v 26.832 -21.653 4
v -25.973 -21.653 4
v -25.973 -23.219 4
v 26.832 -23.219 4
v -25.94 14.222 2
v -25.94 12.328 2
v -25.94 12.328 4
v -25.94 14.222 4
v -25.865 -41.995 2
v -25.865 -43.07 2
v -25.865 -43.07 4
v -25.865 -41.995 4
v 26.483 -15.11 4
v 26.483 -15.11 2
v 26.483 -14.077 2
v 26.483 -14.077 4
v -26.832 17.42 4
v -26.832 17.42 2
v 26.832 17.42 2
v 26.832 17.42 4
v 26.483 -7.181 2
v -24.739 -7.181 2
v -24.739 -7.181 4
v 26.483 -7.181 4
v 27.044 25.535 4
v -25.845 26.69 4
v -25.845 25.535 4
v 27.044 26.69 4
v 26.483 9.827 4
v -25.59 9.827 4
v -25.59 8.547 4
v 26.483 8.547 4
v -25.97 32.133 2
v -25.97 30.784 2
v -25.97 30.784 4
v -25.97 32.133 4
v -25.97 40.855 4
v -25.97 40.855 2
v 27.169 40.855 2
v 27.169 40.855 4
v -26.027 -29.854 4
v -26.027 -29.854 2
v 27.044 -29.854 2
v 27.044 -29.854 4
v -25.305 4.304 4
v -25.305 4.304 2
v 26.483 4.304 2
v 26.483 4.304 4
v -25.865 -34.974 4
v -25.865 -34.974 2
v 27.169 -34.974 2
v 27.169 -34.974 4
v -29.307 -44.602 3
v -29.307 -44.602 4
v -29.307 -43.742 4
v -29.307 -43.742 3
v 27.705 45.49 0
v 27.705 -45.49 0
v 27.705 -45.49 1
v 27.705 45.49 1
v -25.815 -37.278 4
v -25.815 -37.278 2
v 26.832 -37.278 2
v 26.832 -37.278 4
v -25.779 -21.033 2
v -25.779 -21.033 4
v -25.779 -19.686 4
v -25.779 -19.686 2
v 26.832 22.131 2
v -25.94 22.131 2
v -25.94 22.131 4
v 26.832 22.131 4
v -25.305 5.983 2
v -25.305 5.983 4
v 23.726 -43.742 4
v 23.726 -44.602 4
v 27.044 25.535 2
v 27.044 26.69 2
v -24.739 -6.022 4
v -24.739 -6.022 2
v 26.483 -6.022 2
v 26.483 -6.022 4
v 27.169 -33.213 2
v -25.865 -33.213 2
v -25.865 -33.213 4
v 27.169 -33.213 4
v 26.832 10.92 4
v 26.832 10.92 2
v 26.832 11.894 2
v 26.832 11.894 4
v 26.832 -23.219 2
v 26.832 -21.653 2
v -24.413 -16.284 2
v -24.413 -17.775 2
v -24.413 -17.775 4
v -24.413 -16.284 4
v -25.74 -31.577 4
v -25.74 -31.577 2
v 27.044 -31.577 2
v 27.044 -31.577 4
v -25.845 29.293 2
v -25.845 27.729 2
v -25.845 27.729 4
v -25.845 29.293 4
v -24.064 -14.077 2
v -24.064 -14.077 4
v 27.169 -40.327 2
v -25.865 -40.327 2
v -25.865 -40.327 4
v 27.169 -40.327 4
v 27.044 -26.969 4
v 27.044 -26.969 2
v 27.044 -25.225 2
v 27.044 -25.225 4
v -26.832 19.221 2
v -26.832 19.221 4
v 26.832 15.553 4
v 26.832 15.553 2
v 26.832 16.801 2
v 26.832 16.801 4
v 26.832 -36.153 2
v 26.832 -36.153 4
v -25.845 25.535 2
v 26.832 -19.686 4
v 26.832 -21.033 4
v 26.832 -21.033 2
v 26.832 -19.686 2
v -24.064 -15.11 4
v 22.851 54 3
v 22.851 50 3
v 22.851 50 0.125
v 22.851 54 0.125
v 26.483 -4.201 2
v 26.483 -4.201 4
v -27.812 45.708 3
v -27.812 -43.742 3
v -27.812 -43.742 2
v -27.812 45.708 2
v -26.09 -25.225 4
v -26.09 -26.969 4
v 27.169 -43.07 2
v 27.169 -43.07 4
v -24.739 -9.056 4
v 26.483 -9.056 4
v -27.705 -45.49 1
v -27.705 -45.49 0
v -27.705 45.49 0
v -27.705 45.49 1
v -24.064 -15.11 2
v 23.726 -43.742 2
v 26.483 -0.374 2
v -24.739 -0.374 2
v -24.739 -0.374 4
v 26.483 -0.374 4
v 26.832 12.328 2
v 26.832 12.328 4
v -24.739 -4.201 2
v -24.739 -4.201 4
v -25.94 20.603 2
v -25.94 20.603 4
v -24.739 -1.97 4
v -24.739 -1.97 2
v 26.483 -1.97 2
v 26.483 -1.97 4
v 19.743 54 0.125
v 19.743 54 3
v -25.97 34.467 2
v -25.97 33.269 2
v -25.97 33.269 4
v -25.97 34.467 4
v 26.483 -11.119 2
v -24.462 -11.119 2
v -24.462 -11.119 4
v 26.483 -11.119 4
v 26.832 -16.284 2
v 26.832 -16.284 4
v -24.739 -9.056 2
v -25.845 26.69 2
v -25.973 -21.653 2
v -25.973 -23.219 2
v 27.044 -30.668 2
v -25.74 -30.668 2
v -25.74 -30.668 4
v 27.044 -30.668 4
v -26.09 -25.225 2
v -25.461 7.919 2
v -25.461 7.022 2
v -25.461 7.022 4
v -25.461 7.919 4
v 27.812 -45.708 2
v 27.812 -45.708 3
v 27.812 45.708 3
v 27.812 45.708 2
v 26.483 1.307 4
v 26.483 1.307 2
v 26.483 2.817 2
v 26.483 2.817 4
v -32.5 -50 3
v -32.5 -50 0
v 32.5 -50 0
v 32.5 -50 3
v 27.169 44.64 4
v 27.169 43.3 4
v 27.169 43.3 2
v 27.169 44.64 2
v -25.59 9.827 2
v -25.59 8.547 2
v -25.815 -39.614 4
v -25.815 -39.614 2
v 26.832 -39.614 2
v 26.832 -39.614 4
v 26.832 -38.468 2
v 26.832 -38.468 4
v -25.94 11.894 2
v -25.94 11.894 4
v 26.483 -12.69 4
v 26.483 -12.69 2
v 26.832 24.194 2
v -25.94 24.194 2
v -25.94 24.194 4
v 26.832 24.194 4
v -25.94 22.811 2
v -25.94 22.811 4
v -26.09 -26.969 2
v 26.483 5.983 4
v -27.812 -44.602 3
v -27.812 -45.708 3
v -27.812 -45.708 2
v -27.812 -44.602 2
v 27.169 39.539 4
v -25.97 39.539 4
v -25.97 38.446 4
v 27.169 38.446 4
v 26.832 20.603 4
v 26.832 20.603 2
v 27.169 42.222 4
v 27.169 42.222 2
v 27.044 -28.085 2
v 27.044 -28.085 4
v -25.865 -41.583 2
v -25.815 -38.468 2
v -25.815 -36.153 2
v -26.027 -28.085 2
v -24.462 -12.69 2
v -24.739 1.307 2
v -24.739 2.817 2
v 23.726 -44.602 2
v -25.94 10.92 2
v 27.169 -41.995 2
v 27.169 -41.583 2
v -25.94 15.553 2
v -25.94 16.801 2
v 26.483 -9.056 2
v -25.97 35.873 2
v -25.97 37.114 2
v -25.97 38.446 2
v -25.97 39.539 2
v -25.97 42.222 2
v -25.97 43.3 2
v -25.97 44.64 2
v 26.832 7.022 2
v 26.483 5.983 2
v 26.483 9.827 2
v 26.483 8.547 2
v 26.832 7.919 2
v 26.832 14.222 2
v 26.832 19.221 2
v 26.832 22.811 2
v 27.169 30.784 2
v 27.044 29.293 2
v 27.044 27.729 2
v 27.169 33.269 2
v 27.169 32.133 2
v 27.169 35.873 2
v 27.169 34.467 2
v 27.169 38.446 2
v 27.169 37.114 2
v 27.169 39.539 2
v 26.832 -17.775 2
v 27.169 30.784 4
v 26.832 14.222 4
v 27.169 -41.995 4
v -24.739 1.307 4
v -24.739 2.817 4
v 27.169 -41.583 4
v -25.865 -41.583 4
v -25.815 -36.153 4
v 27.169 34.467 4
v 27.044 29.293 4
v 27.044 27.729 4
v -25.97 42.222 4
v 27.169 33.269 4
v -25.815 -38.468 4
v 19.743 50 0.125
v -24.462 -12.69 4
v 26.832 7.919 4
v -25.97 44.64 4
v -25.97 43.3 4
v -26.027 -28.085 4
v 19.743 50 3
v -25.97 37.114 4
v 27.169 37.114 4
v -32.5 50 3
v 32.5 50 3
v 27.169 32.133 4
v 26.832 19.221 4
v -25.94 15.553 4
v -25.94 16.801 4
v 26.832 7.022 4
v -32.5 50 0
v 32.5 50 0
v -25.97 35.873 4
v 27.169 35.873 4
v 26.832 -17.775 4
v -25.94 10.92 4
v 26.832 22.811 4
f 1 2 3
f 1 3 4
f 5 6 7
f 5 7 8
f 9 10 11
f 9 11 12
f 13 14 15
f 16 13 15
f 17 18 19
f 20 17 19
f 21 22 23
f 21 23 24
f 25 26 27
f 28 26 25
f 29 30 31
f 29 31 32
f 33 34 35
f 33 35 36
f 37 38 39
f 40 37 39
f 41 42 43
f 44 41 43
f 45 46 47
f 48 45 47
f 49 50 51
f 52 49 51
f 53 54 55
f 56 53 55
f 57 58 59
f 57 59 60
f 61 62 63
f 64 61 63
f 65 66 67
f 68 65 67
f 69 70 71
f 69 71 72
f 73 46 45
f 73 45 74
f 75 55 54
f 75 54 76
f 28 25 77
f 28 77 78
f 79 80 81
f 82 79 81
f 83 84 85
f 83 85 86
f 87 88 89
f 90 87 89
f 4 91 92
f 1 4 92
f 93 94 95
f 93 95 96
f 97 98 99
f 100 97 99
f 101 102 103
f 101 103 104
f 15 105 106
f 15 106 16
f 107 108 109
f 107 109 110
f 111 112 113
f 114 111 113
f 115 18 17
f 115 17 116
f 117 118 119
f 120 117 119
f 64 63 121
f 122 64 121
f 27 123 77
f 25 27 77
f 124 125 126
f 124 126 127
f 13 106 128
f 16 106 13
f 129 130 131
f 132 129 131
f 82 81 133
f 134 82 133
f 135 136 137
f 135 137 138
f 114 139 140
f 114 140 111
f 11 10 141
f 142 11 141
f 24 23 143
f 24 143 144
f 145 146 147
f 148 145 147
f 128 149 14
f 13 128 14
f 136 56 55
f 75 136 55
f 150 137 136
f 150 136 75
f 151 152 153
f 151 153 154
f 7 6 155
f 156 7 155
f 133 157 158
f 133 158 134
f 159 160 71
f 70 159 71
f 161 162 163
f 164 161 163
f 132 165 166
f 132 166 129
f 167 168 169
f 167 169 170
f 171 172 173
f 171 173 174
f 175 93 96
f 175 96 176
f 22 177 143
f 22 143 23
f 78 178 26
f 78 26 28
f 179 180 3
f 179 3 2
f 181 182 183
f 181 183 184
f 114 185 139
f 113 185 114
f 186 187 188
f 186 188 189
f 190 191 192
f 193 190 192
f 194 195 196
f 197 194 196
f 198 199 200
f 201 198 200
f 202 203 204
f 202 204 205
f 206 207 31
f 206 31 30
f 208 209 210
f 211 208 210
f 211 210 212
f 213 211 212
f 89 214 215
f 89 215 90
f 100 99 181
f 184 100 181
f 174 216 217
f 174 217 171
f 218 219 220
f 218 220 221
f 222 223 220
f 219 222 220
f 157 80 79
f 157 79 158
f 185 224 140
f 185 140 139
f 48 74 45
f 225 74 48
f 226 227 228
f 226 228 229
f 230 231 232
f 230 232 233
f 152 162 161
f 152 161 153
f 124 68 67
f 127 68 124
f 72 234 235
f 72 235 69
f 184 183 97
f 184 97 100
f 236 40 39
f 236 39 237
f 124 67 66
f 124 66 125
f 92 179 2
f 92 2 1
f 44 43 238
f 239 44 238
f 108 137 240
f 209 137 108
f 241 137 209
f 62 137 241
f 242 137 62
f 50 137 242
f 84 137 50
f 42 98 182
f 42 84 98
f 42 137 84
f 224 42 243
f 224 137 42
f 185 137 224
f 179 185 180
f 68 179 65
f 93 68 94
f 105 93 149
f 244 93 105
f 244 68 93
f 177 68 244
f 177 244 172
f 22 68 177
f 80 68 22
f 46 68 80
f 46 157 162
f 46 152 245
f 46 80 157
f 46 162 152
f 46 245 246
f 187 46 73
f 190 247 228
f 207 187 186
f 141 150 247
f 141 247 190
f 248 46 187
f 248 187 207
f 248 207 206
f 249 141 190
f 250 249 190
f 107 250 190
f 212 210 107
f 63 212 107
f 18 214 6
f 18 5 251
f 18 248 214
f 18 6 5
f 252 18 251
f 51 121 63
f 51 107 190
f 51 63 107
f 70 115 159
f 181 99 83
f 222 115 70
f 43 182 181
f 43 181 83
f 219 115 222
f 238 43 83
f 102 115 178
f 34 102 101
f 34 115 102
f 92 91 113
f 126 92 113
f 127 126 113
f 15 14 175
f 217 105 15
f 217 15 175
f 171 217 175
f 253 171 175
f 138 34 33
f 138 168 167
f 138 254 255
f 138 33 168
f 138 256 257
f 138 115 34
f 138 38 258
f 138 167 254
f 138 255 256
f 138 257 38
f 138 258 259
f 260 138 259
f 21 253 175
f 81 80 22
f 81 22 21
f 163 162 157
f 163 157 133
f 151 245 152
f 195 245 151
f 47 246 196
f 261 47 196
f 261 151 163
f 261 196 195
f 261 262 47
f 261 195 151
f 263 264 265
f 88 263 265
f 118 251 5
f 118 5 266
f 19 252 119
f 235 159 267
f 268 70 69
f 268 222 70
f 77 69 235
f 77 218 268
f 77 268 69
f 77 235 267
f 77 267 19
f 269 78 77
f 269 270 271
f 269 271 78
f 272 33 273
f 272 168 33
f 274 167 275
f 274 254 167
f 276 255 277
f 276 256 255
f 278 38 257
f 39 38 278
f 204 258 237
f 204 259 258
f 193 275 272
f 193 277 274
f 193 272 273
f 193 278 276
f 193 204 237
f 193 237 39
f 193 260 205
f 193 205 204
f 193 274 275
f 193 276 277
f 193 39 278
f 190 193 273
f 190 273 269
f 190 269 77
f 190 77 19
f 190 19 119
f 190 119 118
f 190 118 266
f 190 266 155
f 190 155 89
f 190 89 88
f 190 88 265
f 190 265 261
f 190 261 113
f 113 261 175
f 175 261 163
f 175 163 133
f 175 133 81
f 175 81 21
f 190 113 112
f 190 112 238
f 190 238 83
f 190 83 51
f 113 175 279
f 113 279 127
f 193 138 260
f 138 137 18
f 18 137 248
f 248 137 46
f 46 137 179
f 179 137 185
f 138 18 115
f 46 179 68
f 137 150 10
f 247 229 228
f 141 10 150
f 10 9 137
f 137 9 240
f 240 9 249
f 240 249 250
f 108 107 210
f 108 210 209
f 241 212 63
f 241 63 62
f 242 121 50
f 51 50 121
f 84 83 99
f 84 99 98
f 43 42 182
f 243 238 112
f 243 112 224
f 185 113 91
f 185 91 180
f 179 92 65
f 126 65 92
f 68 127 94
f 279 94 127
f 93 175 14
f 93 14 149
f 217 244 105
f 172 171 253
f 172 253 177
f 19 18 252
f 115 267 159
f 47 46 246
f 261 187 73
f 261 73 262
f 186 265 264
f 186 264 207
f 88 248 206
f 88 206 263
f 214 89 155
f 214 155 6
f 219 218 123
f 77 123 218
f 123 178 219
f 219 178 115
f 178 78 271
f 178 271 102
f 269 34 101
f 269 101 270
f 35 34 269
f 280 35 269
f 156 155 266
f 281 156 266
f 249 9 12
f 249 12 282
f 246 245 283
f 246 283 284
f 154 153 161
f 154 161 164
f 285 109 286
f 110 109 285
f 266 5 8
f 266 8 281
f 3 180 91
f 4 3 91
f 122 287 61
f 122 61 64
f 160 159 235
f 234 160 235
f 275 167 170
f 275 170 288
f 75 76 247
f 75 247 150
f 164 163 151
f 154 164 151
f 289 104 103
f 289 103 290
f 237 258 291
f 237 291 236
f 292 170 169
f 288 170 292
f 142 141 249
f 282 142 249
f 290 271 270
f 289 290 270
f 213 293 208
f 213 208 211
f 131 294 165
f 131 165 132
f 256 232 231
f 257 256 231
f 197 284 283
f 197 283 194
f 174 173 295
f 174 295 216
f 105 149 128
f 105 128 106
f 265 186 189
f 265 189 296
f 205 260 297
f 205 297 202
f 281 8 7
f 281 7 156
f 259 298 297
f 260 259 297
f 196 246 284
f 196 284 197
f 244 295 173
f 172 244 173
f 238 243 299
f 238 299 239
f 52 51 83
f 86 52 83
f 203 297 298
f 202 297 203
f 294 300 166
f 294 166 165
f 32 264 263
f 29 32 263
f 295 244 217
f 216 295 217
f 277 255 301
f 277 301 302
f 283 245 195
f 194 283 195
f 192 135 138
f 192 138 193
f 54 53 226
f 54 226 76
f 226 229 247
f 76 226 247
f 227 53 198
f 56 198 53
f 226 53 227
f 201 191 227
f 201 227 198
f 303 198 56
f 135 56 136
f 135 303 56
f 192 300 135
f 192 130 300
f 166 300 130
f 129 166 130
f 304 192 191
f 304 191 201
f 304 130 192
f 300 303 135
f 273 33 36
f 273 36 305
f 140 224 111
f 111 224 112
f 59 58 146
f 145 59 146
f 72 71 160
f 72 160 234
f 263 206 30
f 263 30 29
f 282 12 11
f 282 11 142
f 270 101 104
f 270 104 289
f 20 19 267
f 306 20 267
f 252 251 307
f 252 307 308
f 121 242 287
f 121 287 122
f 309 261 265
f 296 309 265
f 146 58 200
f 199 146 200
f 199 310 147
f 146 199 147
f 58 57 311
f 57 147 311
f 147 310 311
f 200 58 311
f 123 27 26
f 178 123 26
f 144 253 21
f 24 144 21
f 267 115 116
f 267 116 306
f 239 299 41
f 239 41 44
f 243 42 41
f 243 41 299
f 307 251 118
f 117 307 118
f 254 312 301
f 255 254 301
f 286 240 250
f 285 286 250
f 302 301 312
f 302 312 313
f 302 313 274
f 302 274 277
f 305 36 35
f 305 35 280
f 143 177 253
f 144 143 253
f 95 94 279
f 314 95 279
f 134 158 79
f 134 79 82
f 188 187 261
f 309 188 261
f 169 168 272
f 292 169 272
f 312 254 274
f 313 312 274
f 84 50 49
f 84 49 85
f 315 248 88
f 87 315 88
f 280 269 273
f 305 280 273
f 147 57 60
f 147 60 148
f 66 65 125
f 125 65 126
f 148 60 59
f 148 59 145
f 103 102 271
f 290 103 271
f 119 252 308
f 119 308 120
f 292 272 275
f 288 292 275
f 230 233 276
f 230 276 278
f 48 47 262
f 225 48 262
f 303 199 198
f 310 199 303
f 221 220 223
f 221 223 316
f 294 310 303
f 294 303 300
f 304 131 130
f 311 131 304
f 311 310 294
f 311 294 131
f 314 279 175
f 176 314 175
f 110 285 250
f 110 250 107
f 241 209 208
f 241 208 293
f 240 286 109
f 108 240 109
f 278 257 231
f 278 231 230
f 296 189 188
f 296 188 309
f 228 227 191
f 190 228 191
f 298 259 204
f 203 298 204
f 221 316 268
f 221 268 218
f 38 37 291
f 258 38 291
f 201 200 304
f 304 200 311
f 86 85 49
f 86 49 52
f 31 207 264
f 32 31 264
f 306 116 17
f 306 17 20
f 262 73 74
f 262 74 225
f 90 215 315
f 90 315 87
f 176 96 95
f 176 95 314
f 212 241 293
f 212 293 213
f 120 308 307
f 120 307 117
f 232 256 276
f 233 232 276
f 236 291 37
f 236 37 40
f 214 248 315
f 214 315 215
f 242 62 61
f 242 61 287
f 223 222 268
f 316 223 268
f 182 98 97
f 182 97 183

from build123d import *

# Parameters (mm, degrees)
SKETCH1_W           = 65
SKETCH1_H           = 100
BOSS_EXTRUDE1_DEPTH = 3
SKETCH2_W           = 55.410167814
SKETCH2_H           = 90.98098151
CUT_EXTRUDE1_DEPTH  = 1
SKETCH3_W           = 55.623558632
SKETCH3_H           = 91.416954534
CUT_EXTRUDE2_DEPTH  = 1
SKETCH6_W           = 3.108064818
SKETCH6_H           = 2.87479715
BOSS_EXTRUDE3_DEPTH = 4
SKETCH7_W           = 53.138202779
SKETCH7_H           = 1.34003587
SKETCH7_H_2         = 1.367002675
SKETCH7_H_3         = 1.093138183
SKETCH7_H_4         = 1.2410645
SKETCH7_H_5         = 1.197960463
SKETCH7_H_6         = 1.349260721
SKETCH7_W_2         = 52.888399092
SKETCH7_H_7         = 1.564219447
SKETCH7_H_8         = 1.154957354
SKETCH7_W_3         = 52.771419101
SKETCH7_H_9         = 1.382110168
SKETCH7_H_10        = 1.528385576
SKETCH7_W_4         = 53.663634192
SKETCH7_H_11        = 1.80040931
SKETCH7_H_12        = 1.2486786
SKETCH7_H_13        = 1.893914185
SKETCH7_H_14        = 0.973420041
SKETCH7_W_5         = 52.073122621
SKETCH7_H_15        = 1.279744006
SKETCH7_W_6         = 52.292340795
SKETCH7_H_16        = 0.896495241
SKETCH7_W_7         = 51.78751772
SKETCH7_H_17        = 1.679645233
SKETCH7_W_8         = 51.221344093
SKETCH7_H_18        = 1.510054375
SKETCH7_H_19        = 1.595977351
SKETCH7_H_20        = 1.821474854
SKETCH7_H_21        = 1.874986332
SKETCH7_W_9         = 50.944197518
SKETCH7_H_22        = 1.571177337
SKETCH7_W_10        = 50.546929275
SKETCH7_H_23        = 1.032965843
SKETCH7_W_11        = 51.245225755
SKETCH7_H_24        = 1.49164225
SKETCH7_W_12        = 52.610512912
SKETCH7_H_25        = 1.346344249
SKETCH7_W_13        = 52.805112466
SKETCH7_H_26        = 1.56611489
SKETCH7_W_14        = 53.13344098
SKETCH7_H_27        = 1.744841701
SKETCH7_W_15        = 53.070823892
SKETCH7_H_28        = 1.769376556
SKETCH7_W_16        = 52.783863166
SKETCH7_H_29        = 0.909486208
SKETCH7_W_17        = 53.033666853
SKETCH7_H_30        = 1.760540006
SKETCH7_W_18        = 52.646955084
SKETCH7_H_31        = 1.124717702
SKETCH7_H_32        = 1.14667208
SKETCH7_H_33        = 1.255688916
SKETCH7_H_34        = 1.074967726
SKETCH7_H_35        = 0.859854663
BOSS_EXTRUDE4_DEPTH = 2


with BuildPart() as part:
    # Sketch1 → Boss-Extrude1 (new body)
    with BuildSketch(Plane.XY):
        Rectangle(SKETCH1_W, SKETCH1_H)
    extrude(amount=BOSS_EXTRUDE1_DEPTH)

    # Sketch2 → Cut-Extrude1 (cut)
    with BuildSketch(Plane(origin=(0, 0, 0), x_dir=(-1, 0, 0), z_dir=(0, 0, -1))):
        Rectangle(SKETCH2_W, SKETCH2_H)
    extrude(amount=-CUT_EXTRUDE1_DEPTH, mode=Mode.SUBTRACT)

    # Sketch3 → Cut-Extrude2 (cut)
    with BuildSketch(Plane.XY.offset(3)):
        Rectangle(SKETCH3_W, SKETCH3_H)
    extrude(amount=-CUT_EXTRUDE2_DEPTH, mode=Mode.SUBTRACT)

    # Sketch6 → Boss-Extrude3 (add)
    with BuildSketch(Plane(origin=(0, 50, 0), x_dir=(1, 0, 0), z_dir=(0, 1, 0))):
        with Locations((21.296574144, -1.562601425)):
            Rectangle(SKETCH6_W, SKETCH6_H)
    extrude(amount=BOSS_EXTRUDE3_DEPTH)

    # Sketch7 → Boss-Extrude4 (add)
    with BuildSketch(Plane.XY.offset(2)):
        with Locations((0.599551955, 43.969609562)):
            Rectangle(SKETCH7_W, SKETCH7_H)
        with Locations((0.599551955, 41.538839141)):
            Rectangle(SKETCH7_W, SKETCH7_H_2)
        with Locations((0.599551955, 38.992532951)):
            Rectangle(SKETCH7_W, SKETCH7_H_3)
        with Locations((0.599551955, 36.493140866)):
            Rectangle(SKETCH7_W, SKETCH7_H_4)
        with Locations((0.599551955, 33.867810607)):
            Rectangle(SKETCH7_W, SKETCH7_H_5)
        with Locations((0.599551955, 31.458436664)):
            Rectangle(SKETCH7_W, SKETCH7_H_6)
        with Locations((0.599551954, 28.510640838)):
            Rectangle(SKETCH7_W_2, SKETCH7_H_7)
        with Locations((0.599551954, 26.112437241)):
            Rectangle(SKETCH7_W_2, SKETCH7_H_8)
        with Locations((0.446107546, 23.502504221)):
            Rectangle(SKETCH7_W_3, SKETCH7_H_9)
        with Locations((0.446107546, 21.366739211)):
            Rectangle(SKETCH7_W_3, SKETCH7_H_10)
        with Locations((0, 18.320450523)):
            Rectangle(SKETCH7_W_4, SKETCH7_H_11)
        with Locations((0.446107546, 16.176862315)):
            Rectangle(SKETCH7_W_3, SKETCH7_H_12)
        with Locations((0.446107546, 13.275450546)):
            Rectangle(SKETCH7_W_3, SKETCH7_H_13)
        with Locations((0.446107546, 11.407120898)):
            Rectangle(SKETCH7_W_3, SKETCH7_H_14)
        with Locations((0.446107545, 9.187182904)):
            Rectangle(SKETCH7_W_5, SKETCH7_H_15)
        with Locations((0.685646698, 7.470402799)):
            Rectangle(SKETCH7_W_6, SKETCH7_H_16)
        with Locations((0.588909996, 5.14333033)):
            Rectangle(SKETCH7_W_7, SKETCH7_H_17)
        with Locations((0.871996809, 2.062189427)):
            Rectangle(SKETCH7_W_8, SKETCH7_H_18)
        with Locations((0.871996809, -1.172018535)):
            Rectangle(SKETCH7_W_8, SKETCH7_H_19)
        with Locations((0.871996809, -5.111412921)):
            Rectangle(SKETCH7_W_8, SKETCH7_H_20)
        with Locations((0.871996809, -8.118690186)):
            Rectangle(SKETCH7_W_8, SKETCH7_H_21)
        with Locations((1.010570097, -11.904269807)):
            Rectangle(SKETCH7_W_9, SKETCH7_H_22)
        with Locations((1.209204219, -14.593957629)):
            Rectangle(SKETCH7_W_10, SKETCH7_H_23)
        with Locations((1.209204219, -17.029411585)):
            Rectangle(SKETCH7_W_11, SKETCH7_H_24)
        with Locations((0.52656064, -20.359590561)):
            Rectangle(SKETCH7_W_12, SKETCH7_H_25)
        with Locations((0.429260863, -22.436236668)):
            Rectangle(SKETCH7_W_13, SKETCH7_H_26)
        with Locations((0.47703101, -26.096936567)):
            Rectangle(SKETCH7_W_14, SKETCH7_H_27)
        with Locations((0.508339554, -28.969283574)):
            Rectangle(SKETCH7_W_15, SKETCH7_H_28)
        with Locations((0.651819917, -31.122255567)):
            Rectangle(SKETCH7_W_16, SKETCH7_H_29)
        with Locations((0.651819918, -34.0933672)):
            Rectangle(SKETCH7_W_17, SKETCH7_H_30)
        with Locations((0.508339554, -36.71533457)):
            Rectangle(SKETCH7_W_18, SKETCH7_H_31)
        with Locations((0.508339554, -39.040967639)):
            Rectangle(SKETCH7_W_18, SKETCH7_H_32)
        with Locations((0.651819918, -40.955030825)):
            Rectangle(SKETCH7_W_17, SKETCH7_H_33)
        with Locations((0.651819918, -42.532526617)):
            Rectangle(SKETCH7_W_17, SKETCH7_H_34)
        with Locations((-2.790527687, -44.172298267)):
            Rectangle(SKETCH7_W_17, SKETCH7_H_35)
    extrude(amount=BOSS_EXTRUDE4_DEPTH)


solid = part.part
